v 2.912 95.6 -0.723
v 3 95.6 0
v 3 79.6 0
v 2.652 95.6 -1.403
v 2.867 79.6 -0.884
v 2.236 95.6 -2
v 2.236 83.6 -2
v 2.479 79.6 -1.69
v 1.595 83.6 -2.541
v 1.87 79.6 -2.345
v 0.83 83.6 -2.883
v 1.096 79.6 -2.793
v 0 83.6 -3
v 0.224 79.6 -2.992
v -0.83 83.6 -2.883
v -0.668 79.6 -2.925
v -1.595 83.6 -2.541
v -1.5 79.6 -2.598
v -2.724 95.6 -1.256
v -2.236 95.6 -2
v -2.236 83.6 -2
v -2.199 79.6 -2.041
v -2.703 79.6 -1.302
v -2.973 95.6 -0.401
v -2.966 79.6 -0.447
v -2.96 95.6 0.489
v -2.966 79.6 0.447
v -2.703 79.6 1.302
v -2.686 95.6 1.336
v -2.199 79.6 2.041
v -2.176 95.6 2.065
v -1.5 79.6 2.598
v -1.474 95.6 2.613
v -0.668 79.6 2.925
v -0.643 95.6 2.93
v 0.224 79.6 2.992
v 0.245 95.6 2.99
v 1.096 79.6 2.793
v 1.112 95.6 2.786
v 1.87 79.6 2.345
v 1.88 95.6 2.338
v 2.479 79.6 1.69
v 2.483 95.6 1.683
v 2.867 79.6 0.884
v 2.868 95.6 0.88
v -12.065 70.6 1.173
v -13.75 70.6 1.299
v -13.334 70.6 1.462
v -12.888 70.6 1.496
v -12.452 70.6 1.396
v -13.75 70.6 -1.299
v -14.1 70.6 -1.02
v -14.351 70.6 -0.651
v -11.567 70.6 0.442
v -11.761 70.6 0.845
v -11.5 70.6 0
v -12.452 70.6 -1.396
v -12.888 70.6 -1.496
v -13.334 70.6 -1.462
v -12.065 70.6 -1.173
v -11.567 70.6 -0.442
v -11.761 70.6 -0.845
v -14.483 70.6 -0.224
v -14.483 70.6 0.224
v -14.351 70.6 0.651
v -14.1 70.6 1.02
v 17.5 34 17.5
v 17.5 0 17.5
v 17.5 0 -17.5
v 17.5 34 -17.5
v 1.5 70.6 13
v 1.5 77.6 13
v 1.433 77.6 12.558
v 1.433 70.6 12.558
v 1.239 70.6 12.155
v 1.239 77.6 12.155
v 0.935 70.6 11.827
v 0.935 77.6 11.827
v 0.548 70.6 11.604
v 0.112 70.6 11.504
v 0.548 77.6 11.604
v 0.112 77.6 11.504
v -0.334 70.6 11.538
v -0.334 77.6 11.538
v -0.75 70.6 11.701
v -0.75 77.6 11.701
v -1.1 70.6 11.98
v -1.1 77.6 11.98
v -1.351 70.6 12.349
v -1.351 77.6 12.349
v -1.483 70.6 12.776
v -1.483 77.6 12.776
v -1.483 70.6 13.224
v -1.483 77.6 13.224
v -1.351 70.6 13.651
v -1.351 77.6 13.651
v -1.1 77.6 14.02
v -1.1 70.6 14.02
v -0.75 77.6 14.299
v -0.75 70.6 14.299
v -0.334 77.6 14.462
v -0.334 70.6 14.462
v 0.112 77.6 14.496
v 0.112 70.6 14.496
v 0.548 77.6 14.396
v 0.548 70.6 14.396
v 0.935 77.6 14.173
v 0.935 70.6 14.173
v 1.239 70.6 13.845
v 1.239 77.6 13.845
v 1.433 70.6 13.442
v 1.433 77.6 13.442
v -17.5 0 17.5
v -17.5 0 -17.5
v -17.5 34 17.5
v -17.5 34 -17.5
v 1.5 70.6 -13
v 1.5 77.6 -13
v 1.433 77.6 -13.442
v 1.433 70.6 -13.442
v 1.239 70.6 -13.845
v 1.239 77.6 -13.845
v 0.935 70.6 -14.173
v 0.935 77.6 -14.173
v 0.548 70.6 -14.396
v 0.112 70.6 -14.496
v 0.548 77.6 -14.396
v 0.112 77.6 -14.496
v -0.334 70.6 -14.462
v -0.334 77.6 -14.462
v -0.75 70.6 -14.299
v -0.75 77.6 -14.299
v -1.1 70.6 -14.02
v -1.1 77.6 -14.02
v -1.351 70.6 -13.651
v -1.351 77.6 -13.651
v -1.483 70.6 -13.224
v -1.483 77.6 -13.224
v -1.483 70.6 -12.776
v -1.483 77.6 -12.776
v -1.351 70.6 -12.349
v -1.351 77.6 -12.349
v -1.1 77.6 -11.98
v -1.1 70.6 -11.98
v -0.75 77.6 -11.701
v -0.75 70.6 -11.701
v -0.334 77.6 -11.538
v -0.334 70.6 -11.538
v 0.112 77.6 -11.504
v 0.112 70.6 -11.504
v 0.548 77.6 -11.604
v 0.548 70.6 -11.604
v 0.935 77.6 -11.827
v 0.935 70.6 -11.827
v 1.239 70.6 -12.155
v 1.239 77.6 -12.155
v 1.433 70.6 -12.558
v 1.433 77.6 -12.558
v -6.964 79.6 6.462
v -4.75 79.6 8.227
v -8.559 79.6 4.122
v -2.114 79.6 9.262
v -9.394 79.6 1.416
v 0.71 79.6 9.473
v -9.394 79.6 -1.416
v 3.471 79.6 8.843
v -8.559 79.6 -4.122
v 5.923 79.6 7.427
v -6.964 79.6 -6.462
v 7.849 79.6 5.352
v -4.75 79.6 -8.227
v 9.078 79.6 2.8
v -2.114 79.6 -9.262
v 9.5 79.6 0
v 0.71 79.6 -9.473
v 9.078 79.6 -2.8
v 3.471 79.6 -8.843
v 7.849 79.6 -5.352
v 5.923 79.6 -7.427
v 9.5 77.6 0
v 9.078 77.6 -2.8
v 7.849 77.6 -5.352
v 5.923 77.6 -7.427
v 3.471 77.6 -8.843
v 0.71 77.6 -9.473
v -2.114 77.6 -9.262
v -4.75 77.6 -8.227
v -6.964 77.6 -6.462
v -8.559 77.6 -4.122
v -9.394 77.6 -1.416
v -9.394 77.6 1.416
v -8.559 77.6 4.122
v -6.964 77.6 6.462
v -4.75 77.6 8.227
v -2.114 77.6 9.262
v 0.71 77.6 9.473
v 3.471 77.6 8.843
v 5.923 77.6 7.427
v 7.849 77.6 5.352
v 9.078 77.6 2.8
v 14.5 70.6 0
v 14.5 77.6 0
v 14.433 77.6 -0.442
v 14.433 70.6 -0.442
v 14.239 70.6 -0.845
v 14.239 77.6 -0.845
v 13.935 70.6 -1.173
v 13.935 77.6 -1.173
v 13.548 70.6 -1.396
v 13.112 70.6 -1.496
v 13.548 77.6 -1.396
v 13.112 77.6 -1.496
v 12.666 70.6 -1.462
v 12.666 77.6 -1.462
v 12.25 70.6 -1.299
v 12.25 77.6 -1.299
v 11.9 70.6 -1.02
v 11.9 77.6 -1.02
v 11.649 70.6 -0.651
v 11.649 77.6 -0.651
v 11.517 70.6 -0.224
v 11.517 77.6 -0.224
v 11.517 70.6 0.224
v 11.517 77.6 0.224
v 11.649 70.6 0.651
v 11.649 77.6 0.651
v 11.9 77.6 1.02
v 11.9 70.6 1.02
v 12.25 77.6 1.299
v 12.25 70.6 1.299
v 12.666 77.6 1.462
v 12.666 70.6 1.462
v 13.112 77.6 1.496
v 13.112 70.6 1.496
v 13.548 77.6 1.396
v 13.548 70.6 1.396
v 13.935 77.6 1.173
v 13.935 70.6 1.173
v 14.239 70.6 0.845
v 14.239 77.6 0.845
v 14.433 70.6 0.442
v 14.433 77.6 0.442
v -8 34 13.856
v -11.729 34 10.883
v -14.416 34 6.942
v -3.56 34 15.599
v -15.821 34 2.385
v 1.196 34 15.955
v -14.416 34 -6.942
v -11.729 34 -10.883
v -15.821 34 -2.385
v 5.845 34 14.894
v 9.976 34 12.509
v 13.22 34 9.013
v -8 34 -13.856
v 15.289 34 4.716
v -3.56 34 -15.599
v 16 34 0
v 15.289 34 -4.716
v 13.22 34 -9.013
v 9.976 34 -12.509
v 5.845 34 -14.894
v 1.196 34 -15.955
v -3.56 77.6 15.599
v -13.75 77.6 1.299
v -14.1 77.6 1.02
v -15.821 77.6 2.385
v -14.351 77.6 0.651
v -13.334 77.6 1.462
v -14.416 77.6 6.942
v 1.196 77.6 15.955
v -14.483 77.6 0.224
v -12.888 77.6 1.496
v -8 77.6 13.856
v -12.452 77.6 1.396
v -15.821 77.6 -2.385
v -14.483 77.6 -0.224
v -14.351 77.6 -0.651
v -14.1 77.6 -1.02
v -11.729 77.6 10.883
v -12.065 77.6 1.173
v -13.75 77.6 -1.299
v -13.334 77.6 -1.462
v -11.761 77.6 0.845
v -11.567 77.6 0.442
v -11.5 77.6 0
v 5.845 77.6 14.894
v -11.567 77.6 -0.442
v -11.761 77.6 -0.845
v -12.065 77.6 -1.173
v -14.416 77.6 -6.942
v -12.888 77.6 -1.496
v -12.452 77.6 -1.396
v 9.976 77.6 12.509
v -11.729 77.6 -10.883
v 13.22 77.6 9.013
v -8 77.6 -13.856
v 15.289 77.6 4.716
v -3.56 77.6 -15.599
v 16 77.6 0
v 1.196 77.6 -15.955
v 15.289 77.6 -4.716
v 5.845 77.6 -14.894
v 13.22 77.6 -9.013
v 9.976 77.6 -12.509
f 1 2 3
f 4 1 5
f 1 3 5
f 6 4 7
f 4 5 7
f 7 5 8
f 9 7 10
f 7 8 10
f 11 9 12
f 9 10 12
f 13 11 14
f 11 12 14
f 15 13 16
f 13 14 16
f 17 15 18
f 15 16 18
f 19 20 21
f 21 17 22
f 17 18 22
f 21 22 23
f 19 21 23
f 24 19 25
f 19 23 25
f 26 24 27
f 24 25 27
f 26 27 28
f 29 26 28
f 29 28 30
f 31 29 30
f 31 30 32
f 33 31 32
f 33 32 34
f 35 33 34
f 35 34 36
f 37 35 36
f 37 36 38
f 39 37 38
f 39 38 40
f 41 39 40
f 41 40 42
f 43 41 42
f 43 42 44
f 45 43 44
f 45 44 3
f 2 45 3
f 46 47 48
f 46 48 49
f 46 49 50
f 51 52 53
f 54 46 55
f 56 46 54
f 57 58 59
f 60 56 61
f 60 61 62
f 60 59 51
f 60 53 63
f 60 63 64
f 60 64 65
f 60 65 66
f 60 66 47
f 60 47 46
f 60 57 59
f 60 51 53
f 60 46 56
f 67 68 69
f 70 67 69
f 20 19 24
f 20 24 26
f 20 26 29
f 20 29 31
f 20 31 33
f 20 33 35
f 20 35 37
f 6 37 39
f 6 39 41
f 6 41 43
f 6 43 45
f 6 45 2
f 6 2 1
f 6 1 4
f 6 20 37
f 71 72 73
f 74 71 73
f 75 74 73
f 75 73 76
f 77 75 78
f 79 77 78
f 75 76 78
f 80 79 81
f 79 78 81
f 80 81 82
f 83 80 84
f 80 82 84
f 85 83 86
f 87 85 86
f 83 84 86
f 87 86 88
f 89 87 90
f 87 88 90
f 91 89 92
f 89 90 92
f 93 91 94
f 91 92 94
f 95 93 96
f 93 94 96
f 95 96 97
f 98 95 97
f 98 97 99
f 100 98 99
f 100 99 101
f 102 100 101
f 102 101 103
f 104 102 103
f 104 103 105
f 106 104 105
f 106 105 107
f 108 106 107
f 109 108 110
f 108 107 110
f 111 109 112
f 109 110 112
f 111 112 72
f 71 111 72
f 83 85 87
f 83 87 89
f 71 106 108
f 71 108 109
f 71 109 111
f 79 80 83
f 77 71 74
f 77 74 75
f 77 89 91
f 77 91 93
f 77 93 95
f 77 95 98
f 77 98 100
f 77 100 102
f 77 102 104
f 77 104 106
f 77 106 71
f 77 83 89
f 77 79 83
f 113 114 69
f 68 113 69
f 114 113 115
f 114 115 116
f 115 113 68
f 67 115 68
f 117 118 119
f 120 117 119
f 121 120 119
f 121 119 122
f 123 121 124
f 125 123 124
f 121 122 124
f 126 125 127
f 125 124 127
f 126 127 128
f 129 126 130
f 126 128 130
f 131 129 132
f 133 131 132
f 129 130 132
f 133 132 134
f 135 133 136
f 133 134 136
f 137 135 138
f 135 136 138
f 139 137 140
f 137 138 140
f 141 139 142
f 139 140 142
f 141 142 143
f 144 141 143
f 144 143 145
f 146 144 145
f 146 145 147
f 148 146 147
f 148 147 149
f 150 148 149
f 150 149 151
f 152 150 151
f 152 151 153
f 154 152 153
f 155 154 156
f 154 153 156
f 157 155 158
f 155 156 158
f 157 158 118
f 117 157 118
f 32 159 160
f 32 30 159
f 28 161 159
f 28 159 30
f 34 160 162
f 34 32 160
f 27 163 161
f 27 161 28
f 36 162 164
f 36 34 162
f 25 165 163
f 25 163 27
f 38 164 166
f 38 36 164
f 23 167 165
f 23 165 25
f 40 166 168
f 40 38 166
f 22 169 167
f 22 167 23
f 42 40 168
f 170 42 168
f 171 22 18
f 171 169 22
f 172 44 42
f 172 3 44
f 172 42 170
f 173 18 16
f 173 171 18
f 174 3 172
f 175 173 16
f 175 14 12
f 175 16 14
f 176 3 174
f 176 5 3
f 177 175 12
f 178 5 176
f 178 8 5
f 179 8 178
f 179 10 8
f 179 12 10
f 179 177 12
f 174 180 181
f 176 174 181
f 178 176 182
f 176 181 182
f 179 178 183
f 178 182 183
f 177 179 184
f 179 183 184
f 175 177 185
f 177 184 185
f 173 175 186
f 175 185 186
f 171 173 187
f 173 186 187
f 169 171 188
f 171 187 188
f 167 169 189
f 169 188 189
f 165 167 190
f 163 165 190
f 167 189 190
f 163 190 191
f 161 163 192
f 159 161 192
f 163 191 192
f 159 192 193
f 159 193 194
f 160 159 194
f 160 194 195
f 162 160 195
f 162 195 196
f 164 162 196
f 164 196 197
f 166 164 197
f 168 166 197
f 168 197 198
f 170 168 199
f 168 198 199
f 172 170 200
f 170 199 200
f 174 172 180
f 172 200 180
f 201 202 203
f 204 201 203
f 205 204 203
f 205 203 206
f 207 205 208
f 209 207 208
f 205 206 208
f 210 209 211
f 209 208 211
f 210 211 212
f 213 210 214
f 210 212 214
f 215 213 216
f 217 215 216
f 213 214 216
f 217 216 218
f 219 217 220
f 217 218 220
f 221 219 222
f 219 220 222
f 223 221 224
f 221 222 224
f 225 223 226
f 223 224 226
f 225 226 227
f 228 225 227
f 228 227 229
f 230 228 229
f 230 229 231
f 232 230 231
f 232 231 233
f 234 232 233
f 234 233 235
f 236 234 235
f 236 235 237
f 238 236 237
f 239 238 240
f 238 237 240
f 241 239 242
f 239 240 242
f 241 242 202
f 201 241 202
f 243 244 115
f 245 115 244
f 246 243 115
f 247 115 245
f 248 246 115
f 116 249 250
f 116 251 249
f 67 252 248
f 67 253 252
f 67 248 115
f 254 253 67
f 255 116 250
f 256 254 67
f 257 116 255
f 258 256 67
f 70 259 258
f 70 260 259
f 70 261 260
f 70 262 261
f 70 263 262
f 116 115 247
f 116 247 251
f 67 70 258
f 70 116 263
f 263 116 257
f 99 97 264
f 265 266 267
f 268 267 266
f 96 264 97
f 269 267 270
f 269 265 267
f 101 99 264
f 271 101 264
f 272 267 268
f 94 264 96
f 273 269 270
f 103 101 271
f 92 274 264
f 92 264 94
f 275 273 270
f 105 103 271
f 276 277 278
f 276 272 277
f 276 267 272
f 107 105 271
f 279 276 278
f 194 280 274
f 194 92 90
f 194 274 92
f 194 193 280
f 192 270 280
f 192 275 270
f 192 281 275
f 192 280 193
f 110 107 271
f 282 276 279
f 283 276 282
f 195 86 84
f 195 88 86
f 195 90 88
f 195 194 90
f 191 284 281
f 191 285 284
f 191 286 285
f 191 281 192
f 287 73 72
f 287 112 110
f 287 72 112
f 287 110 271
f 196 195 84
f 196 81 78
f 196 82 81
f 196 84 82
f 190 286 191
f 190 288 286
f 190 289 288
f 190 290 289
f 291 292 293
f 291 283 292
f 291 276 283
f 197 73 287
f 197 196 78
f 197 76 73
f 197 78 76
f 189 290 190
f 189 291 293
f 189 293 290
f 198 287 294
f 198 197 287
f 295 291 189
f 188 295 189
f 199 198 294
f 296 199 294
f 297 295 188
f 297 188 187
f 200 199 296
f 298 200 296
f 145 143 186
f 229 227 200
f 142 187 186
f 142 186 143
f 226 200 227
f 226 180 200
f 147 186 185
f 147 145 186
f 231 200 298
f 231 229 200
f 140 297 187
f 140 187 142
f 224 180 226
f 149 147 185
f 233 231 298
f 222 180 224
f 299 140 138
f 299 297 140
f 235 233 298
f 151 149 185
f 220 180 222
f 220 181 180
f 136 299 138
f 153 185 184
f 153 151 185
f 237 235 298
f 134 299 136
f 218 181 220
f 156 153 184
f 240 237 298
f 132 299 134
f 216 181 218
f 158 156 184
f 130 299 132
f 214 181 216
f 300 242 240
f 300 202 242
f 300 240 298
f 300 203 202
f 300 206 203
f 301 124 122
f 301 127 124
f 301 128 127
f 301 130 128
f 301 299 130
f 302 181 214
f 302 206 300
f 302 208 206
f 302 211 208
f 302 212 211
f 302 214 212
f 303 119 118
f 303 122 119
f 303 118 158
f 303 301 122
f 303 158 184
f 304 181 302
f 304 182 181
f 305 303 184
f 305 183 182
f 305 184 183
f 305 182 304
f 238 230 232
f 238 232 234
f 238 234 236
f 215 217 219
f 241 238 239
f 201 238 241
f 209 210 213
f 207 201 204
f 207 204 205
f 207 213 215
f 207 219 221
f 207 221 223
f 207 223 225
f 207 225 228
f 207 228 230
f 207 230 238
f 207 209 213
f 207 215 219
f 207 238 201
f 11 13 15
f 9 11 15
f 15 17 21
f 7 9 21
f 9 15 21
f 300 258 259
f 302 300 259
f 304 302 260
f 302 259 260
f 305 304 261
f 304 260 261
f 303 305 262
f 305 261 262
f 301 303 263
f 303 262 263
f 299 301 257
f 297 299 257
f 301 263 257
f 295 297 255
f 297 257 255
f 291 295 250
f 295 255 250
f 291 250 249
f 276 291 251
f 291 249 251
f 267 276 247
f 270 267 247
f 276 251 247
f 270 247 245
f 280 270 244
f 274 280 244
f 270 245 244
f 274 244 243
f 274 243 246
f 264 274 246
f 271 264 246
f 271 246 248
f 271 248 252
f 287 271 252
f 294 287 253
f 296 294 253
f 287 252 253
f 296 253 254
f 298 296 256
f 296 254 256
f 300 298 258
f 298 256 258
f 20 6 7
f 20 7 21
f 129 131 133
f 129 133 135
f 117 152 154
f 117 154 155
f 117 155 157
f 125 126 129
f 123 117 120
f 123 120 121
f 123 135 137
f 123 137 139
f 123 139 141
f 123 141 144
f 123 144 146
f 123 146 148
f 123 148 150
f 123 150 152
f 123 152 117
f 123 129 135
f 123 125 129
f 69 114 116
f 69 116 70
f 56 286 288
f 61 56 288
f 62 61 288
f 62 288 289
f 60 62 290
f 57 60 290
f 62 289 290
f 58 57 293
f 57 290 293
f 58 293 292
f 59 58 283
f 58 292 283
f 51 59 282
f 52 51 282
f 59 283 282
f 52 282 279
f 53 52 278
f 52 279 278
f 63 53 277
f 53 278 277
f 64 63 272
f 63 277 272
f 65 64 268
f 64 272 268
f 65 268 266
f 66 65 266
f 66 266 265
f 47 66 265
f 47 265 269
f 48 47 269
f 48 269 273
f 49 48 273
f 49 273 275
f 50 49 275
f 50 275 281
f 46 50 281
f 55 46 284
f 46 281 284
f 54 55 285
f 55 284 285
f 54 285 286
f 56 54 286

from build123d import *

# Parameters (mm, degrees)
SKETCH1_W           = 35
SKETCH1_H           = 35
BOSS_EXTRUDE1_DEPTH = 34
SKETCH2_R           = 16
BOSS_EXTRUDE2_DEPTH = 43.6
SKETCH3_R           = 9.5
BOSS_EXTRUDE3_DEPTH = 2
SKETCH4_R           = 3
BOSS_EXTRUDE4_DEPTH = 16
CUT_EXTRUDE1_DEPTH  = 12
SKETCH6_R           = 1.5
CUT_EXTRUDE2_DEPTH  = 7


with BuildPart() as part:
    # Sketch1 → Boss-Extrude1 (new body)
    with BuildSketch(Plane(origin=(0, 0, 0), x_dir=(1, 0, 0), z_dir=(0, 1, 0))):
        Rectangle(SKETCH1_W, SKETCH1_H)
    extrude(amount=BOSS_EXTRUDE1_DEPTH)

    # Sketch2 → Boss-Extrude2 (add)
    with BuildSketch(Plane(origin=(0, 34, 0), x_dir=(1, 0, 0), z_dir=(0, 1, 0))):
        Circle(SKETCH2_R)
    extrude(amount=BOSS_EXTRUDE2_DEPTH)

    # Sketch3 → Boss-Extrude3 (add)
    with BuildSketch(Plane(origin=(0, 77.6, 0), x_dir=(1, 0, 0), z_dir=(0, 1, 0))):
        Circle(SKETCH3_R)
    extrude(amount=BOSS_EXTRUDE3_DEPTH)

    # Sketch4 → Boss-Extrude4 (add)
    with BuildSketch(Plane(origin=(0, 79.6, 0), x_dir=(1, 0, 0), z_dir=(0, 1, 0))):
        Circle(SKETCH4_R)
    extrude(amount=BOSS_EXTRUDE4_DEPTH)

    # Sketch5 → Cut-Extrude1 (cut)
    with BuildSketch(Plane(origin=(0, 95.6, 0), x_dir=(1, 0, 0), z_dir=(0, 1, 0))):
        with BuildLine():
            Line((2.236067977, 2), (-2.236067977, 2))
            ThreePointArc((-2.236067977, 2), (0, 3), (2.236067977, 2))
        make_face()
    extrude(amount=-CUT_EXTRUDE1_DEPTH, mode=Mode.SUBTRACT)

    # Sketch6 → Cut-Extrude2 (cut)
    with BuildSketch(Plane(origin=(0, 77.6, 0), x_dir=(1, 0, 0), z_dir=(0, 1, 0))):
        with Locations((0, 13)):
            Circle(SKETCH6_R)
        with Locations((13, 0)):
            Circle(SKETCH6_R)
        with Locations((-13, 0)):
            Circle(SKETCH6_R)
        with Locations((0, -13)):
            Circle(SKETCH6_R)
    extrude(amount=-CUT_EXTRUDE2_DEPTH, mode=Mode.SUBTRACT)


solid = part.part
